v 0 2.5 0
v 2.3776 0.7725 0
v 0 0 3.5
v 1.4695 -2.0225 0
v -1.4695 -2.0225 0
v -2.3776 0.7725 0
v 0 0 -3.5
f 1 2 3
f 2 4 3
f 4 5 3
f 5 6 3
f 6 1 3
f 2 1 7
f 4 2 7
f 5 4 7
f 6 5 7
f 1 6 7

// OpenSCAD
/* [Die] */

// Distance from point to point
height = 7; // [10:100]
// Distance from one side to the other, through the middle
width = 5; // [10:100]

max_z = height/2;
max_y = width/2;

/* [Face text] */

// Font to use for the faces
text_font = "Roboto";
// Size of the text for the faces
text_size = 8.0; // [1:100]
// Depth of the text
text_depth = 0.2;

// Text to use the for "1" face
1_text = "1";
// Text to use the for "2" face
2_text = "2";
// Text to use the for "3" face
3_text = "3";
// Text to use the for "4" face
4_text = "4";
// Text to use the for "5" face
5_text = "5";
// Text to use the for "6" face
6_text = "6";
// Text to use the for "7" face
7_text = "7";
// Text to use the for "8" face
8_text = "8";
// Text to use the for "9" face
9_text = "9";
// Text to use the for "10" face
10_text = "10";

// The top and bottom are easy. The middle is a pentagon.
// http://mathworld.wolfram.com/Pentagon.html
c1 = (1/4)*(sqrt(5) - 1)*max_y;
c2 = (1/4)*(sqrt(5) + 1)*max_y;
s1 = (1/4)*(sqrt(10 + 2*sqrt(5)))*max_y;
s2 = (1/4)*(sqrt(10 - 2*sqrt(5)))*max_y;

points = [
  [0, 0, max_z],  // 0 - top
  [0, 0, -max_z], // 1 - bottom
  [0, max_y, 0],      // 2 - pentagon 1
  [s1, c1, 0],    // 3 - pentagon 2
  [s2, -c2, 0],   // 4 - pentagon 3
  [-s2, -c2, 0],  // 5 - pentagon 4
  [-s1, c1, 0]   // 6 - pentagon 5
];

faces = [
  [0, 3, 2], // 1
  [0, 4, 3], // 2
  [0, 5, 4], // 3
  [0, 6, 5], // 4
  [0, 2, 6], // 5
  [1, 2, 3], // 6
  [1, 3, 4], // 7
  [1, 4, 5], // 8
  [1, 5, 6], // 9
  [1, 6, 2] // 10
];

difference() {
  polyhedron(points, faces);
}
